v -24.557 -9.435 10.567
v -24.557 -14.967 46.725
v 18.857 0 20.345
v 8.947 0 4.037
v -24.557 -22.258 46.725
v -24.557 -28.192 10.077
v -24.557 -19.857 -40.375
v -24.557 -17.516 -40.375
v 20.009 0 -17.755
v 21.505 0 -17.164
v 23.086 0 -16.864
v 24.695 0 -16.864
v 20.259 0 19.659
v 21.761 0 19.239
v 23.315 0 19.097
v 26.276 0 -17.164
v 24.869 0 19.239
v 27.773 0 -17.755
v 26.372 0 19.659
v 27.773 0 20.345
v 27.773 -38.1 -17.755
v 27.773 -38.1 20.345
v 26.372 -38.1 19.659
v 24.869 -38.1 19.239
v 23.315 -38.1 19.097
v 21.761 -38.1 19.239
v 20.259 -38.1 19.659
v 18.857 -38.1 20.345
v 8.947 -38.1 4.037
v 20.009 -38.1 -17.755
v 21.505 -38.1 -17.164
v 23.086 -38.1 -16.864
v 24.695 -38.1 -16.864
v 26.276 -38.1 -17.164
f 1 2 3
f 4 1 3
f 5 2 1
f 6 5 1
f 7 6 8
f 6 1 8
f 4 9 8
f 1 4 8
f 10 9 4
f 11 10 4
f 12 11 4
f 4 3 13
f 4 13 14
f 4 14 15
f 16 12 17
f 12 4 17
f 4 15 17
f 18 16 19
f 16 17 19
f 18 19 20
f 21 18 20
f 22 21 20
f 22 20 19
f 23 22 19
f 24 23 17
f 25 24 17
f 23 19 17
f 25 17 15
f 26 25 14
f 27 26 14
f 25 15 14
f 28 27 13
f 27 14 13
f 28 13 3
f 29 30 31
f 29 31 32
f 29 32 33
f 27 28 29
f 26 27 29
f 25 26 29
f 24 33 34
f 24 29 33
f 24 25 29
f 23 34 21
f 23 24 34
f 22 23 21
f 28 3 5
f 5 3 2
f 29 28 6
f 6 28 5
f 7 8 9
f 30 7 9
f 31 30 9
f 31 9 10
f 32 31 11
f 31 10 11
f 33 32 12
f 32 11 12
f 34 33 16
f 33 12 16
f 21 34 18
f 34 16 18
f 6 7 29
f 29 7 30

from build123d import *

# Parameters (mm, degrees)
F1_DEPTH = 38.1
F3_DEPTH = 101.6
F5_DEPTH = 127


with BuildPart() as f1:
    # F0 (on Front) → F1 (new body)
    with BuildSketch(Plane.XZ):
        with BuildLine():
            Line((27.7732536197, -17.7548748881), (27.7732536197, 20.3451251119))
            ThreePointArc((27.7732536197, 20.3451251119), (23.3150850981, 19.0968449339), (18.8569165766, 20.3451251119))
            Line((18.8569165766, 20.3451251119), (-24.5568101805, 46.7248205056))
            Line((-24.5568101805, 46.7248205056), (-24.5568101805, -40.3753659966))
            Line((-24.5568101805, -40.3753659966), (20.0085155666, -17.7548748881))
            ThreePointArc((20.0085155666, -17.7548748881), (23.8908845931, -16.8259725337), (27.7732536197, -17.7548748881))
        make_face()
    extrude(amount=F1_DEPTH)

    # F2 (on face) → F3 (cut)
    with BuildSketch(Plane(origin=(11.2647537366, 0, -22.1930380433), x_dir=(0.8917070033, 0, 0.4526131022), z_dir=(0.4526131022, 0, -0.8917070033))):
        Polygon((-40.1718992738, 0), (9.8056444527, 0), (-40.1718992738, 17.5163969398), align=None)
        Polygon((-40.1718992738, 19.8567565531), (9.8056444527, 38.1), (-40.1718992738, 38.1), align=None)
    extrude(amount=-F3_DEPTH, mode=Mode.SUBTRACT)

    # F4 (on face) → F5 (cut)
    with BuildSketch(Plane(origin=(14.113699436, 0, 23.2272693714), x_dir=(0.8546009204, 0, -0.5192853424), z_dir=(0.5192853424, 0, 0.8546009204))):
        Polygon((-25.222287783, -38.1), (5.5502130028, -38.1), (-45.2497869972, -22.2575453606), (-45.2497869972, -34.247172677), align=None)
        Polygon((-45.2497869972, -14.9671534034), (5.5502130028, 0), (-25.222287783, 0), (-45.2497869972, -3.6993231454), align=None)
    extrude(amount=-F5_DEPTH, mode=Mode.SUBTRACT)


solid = f1.part
